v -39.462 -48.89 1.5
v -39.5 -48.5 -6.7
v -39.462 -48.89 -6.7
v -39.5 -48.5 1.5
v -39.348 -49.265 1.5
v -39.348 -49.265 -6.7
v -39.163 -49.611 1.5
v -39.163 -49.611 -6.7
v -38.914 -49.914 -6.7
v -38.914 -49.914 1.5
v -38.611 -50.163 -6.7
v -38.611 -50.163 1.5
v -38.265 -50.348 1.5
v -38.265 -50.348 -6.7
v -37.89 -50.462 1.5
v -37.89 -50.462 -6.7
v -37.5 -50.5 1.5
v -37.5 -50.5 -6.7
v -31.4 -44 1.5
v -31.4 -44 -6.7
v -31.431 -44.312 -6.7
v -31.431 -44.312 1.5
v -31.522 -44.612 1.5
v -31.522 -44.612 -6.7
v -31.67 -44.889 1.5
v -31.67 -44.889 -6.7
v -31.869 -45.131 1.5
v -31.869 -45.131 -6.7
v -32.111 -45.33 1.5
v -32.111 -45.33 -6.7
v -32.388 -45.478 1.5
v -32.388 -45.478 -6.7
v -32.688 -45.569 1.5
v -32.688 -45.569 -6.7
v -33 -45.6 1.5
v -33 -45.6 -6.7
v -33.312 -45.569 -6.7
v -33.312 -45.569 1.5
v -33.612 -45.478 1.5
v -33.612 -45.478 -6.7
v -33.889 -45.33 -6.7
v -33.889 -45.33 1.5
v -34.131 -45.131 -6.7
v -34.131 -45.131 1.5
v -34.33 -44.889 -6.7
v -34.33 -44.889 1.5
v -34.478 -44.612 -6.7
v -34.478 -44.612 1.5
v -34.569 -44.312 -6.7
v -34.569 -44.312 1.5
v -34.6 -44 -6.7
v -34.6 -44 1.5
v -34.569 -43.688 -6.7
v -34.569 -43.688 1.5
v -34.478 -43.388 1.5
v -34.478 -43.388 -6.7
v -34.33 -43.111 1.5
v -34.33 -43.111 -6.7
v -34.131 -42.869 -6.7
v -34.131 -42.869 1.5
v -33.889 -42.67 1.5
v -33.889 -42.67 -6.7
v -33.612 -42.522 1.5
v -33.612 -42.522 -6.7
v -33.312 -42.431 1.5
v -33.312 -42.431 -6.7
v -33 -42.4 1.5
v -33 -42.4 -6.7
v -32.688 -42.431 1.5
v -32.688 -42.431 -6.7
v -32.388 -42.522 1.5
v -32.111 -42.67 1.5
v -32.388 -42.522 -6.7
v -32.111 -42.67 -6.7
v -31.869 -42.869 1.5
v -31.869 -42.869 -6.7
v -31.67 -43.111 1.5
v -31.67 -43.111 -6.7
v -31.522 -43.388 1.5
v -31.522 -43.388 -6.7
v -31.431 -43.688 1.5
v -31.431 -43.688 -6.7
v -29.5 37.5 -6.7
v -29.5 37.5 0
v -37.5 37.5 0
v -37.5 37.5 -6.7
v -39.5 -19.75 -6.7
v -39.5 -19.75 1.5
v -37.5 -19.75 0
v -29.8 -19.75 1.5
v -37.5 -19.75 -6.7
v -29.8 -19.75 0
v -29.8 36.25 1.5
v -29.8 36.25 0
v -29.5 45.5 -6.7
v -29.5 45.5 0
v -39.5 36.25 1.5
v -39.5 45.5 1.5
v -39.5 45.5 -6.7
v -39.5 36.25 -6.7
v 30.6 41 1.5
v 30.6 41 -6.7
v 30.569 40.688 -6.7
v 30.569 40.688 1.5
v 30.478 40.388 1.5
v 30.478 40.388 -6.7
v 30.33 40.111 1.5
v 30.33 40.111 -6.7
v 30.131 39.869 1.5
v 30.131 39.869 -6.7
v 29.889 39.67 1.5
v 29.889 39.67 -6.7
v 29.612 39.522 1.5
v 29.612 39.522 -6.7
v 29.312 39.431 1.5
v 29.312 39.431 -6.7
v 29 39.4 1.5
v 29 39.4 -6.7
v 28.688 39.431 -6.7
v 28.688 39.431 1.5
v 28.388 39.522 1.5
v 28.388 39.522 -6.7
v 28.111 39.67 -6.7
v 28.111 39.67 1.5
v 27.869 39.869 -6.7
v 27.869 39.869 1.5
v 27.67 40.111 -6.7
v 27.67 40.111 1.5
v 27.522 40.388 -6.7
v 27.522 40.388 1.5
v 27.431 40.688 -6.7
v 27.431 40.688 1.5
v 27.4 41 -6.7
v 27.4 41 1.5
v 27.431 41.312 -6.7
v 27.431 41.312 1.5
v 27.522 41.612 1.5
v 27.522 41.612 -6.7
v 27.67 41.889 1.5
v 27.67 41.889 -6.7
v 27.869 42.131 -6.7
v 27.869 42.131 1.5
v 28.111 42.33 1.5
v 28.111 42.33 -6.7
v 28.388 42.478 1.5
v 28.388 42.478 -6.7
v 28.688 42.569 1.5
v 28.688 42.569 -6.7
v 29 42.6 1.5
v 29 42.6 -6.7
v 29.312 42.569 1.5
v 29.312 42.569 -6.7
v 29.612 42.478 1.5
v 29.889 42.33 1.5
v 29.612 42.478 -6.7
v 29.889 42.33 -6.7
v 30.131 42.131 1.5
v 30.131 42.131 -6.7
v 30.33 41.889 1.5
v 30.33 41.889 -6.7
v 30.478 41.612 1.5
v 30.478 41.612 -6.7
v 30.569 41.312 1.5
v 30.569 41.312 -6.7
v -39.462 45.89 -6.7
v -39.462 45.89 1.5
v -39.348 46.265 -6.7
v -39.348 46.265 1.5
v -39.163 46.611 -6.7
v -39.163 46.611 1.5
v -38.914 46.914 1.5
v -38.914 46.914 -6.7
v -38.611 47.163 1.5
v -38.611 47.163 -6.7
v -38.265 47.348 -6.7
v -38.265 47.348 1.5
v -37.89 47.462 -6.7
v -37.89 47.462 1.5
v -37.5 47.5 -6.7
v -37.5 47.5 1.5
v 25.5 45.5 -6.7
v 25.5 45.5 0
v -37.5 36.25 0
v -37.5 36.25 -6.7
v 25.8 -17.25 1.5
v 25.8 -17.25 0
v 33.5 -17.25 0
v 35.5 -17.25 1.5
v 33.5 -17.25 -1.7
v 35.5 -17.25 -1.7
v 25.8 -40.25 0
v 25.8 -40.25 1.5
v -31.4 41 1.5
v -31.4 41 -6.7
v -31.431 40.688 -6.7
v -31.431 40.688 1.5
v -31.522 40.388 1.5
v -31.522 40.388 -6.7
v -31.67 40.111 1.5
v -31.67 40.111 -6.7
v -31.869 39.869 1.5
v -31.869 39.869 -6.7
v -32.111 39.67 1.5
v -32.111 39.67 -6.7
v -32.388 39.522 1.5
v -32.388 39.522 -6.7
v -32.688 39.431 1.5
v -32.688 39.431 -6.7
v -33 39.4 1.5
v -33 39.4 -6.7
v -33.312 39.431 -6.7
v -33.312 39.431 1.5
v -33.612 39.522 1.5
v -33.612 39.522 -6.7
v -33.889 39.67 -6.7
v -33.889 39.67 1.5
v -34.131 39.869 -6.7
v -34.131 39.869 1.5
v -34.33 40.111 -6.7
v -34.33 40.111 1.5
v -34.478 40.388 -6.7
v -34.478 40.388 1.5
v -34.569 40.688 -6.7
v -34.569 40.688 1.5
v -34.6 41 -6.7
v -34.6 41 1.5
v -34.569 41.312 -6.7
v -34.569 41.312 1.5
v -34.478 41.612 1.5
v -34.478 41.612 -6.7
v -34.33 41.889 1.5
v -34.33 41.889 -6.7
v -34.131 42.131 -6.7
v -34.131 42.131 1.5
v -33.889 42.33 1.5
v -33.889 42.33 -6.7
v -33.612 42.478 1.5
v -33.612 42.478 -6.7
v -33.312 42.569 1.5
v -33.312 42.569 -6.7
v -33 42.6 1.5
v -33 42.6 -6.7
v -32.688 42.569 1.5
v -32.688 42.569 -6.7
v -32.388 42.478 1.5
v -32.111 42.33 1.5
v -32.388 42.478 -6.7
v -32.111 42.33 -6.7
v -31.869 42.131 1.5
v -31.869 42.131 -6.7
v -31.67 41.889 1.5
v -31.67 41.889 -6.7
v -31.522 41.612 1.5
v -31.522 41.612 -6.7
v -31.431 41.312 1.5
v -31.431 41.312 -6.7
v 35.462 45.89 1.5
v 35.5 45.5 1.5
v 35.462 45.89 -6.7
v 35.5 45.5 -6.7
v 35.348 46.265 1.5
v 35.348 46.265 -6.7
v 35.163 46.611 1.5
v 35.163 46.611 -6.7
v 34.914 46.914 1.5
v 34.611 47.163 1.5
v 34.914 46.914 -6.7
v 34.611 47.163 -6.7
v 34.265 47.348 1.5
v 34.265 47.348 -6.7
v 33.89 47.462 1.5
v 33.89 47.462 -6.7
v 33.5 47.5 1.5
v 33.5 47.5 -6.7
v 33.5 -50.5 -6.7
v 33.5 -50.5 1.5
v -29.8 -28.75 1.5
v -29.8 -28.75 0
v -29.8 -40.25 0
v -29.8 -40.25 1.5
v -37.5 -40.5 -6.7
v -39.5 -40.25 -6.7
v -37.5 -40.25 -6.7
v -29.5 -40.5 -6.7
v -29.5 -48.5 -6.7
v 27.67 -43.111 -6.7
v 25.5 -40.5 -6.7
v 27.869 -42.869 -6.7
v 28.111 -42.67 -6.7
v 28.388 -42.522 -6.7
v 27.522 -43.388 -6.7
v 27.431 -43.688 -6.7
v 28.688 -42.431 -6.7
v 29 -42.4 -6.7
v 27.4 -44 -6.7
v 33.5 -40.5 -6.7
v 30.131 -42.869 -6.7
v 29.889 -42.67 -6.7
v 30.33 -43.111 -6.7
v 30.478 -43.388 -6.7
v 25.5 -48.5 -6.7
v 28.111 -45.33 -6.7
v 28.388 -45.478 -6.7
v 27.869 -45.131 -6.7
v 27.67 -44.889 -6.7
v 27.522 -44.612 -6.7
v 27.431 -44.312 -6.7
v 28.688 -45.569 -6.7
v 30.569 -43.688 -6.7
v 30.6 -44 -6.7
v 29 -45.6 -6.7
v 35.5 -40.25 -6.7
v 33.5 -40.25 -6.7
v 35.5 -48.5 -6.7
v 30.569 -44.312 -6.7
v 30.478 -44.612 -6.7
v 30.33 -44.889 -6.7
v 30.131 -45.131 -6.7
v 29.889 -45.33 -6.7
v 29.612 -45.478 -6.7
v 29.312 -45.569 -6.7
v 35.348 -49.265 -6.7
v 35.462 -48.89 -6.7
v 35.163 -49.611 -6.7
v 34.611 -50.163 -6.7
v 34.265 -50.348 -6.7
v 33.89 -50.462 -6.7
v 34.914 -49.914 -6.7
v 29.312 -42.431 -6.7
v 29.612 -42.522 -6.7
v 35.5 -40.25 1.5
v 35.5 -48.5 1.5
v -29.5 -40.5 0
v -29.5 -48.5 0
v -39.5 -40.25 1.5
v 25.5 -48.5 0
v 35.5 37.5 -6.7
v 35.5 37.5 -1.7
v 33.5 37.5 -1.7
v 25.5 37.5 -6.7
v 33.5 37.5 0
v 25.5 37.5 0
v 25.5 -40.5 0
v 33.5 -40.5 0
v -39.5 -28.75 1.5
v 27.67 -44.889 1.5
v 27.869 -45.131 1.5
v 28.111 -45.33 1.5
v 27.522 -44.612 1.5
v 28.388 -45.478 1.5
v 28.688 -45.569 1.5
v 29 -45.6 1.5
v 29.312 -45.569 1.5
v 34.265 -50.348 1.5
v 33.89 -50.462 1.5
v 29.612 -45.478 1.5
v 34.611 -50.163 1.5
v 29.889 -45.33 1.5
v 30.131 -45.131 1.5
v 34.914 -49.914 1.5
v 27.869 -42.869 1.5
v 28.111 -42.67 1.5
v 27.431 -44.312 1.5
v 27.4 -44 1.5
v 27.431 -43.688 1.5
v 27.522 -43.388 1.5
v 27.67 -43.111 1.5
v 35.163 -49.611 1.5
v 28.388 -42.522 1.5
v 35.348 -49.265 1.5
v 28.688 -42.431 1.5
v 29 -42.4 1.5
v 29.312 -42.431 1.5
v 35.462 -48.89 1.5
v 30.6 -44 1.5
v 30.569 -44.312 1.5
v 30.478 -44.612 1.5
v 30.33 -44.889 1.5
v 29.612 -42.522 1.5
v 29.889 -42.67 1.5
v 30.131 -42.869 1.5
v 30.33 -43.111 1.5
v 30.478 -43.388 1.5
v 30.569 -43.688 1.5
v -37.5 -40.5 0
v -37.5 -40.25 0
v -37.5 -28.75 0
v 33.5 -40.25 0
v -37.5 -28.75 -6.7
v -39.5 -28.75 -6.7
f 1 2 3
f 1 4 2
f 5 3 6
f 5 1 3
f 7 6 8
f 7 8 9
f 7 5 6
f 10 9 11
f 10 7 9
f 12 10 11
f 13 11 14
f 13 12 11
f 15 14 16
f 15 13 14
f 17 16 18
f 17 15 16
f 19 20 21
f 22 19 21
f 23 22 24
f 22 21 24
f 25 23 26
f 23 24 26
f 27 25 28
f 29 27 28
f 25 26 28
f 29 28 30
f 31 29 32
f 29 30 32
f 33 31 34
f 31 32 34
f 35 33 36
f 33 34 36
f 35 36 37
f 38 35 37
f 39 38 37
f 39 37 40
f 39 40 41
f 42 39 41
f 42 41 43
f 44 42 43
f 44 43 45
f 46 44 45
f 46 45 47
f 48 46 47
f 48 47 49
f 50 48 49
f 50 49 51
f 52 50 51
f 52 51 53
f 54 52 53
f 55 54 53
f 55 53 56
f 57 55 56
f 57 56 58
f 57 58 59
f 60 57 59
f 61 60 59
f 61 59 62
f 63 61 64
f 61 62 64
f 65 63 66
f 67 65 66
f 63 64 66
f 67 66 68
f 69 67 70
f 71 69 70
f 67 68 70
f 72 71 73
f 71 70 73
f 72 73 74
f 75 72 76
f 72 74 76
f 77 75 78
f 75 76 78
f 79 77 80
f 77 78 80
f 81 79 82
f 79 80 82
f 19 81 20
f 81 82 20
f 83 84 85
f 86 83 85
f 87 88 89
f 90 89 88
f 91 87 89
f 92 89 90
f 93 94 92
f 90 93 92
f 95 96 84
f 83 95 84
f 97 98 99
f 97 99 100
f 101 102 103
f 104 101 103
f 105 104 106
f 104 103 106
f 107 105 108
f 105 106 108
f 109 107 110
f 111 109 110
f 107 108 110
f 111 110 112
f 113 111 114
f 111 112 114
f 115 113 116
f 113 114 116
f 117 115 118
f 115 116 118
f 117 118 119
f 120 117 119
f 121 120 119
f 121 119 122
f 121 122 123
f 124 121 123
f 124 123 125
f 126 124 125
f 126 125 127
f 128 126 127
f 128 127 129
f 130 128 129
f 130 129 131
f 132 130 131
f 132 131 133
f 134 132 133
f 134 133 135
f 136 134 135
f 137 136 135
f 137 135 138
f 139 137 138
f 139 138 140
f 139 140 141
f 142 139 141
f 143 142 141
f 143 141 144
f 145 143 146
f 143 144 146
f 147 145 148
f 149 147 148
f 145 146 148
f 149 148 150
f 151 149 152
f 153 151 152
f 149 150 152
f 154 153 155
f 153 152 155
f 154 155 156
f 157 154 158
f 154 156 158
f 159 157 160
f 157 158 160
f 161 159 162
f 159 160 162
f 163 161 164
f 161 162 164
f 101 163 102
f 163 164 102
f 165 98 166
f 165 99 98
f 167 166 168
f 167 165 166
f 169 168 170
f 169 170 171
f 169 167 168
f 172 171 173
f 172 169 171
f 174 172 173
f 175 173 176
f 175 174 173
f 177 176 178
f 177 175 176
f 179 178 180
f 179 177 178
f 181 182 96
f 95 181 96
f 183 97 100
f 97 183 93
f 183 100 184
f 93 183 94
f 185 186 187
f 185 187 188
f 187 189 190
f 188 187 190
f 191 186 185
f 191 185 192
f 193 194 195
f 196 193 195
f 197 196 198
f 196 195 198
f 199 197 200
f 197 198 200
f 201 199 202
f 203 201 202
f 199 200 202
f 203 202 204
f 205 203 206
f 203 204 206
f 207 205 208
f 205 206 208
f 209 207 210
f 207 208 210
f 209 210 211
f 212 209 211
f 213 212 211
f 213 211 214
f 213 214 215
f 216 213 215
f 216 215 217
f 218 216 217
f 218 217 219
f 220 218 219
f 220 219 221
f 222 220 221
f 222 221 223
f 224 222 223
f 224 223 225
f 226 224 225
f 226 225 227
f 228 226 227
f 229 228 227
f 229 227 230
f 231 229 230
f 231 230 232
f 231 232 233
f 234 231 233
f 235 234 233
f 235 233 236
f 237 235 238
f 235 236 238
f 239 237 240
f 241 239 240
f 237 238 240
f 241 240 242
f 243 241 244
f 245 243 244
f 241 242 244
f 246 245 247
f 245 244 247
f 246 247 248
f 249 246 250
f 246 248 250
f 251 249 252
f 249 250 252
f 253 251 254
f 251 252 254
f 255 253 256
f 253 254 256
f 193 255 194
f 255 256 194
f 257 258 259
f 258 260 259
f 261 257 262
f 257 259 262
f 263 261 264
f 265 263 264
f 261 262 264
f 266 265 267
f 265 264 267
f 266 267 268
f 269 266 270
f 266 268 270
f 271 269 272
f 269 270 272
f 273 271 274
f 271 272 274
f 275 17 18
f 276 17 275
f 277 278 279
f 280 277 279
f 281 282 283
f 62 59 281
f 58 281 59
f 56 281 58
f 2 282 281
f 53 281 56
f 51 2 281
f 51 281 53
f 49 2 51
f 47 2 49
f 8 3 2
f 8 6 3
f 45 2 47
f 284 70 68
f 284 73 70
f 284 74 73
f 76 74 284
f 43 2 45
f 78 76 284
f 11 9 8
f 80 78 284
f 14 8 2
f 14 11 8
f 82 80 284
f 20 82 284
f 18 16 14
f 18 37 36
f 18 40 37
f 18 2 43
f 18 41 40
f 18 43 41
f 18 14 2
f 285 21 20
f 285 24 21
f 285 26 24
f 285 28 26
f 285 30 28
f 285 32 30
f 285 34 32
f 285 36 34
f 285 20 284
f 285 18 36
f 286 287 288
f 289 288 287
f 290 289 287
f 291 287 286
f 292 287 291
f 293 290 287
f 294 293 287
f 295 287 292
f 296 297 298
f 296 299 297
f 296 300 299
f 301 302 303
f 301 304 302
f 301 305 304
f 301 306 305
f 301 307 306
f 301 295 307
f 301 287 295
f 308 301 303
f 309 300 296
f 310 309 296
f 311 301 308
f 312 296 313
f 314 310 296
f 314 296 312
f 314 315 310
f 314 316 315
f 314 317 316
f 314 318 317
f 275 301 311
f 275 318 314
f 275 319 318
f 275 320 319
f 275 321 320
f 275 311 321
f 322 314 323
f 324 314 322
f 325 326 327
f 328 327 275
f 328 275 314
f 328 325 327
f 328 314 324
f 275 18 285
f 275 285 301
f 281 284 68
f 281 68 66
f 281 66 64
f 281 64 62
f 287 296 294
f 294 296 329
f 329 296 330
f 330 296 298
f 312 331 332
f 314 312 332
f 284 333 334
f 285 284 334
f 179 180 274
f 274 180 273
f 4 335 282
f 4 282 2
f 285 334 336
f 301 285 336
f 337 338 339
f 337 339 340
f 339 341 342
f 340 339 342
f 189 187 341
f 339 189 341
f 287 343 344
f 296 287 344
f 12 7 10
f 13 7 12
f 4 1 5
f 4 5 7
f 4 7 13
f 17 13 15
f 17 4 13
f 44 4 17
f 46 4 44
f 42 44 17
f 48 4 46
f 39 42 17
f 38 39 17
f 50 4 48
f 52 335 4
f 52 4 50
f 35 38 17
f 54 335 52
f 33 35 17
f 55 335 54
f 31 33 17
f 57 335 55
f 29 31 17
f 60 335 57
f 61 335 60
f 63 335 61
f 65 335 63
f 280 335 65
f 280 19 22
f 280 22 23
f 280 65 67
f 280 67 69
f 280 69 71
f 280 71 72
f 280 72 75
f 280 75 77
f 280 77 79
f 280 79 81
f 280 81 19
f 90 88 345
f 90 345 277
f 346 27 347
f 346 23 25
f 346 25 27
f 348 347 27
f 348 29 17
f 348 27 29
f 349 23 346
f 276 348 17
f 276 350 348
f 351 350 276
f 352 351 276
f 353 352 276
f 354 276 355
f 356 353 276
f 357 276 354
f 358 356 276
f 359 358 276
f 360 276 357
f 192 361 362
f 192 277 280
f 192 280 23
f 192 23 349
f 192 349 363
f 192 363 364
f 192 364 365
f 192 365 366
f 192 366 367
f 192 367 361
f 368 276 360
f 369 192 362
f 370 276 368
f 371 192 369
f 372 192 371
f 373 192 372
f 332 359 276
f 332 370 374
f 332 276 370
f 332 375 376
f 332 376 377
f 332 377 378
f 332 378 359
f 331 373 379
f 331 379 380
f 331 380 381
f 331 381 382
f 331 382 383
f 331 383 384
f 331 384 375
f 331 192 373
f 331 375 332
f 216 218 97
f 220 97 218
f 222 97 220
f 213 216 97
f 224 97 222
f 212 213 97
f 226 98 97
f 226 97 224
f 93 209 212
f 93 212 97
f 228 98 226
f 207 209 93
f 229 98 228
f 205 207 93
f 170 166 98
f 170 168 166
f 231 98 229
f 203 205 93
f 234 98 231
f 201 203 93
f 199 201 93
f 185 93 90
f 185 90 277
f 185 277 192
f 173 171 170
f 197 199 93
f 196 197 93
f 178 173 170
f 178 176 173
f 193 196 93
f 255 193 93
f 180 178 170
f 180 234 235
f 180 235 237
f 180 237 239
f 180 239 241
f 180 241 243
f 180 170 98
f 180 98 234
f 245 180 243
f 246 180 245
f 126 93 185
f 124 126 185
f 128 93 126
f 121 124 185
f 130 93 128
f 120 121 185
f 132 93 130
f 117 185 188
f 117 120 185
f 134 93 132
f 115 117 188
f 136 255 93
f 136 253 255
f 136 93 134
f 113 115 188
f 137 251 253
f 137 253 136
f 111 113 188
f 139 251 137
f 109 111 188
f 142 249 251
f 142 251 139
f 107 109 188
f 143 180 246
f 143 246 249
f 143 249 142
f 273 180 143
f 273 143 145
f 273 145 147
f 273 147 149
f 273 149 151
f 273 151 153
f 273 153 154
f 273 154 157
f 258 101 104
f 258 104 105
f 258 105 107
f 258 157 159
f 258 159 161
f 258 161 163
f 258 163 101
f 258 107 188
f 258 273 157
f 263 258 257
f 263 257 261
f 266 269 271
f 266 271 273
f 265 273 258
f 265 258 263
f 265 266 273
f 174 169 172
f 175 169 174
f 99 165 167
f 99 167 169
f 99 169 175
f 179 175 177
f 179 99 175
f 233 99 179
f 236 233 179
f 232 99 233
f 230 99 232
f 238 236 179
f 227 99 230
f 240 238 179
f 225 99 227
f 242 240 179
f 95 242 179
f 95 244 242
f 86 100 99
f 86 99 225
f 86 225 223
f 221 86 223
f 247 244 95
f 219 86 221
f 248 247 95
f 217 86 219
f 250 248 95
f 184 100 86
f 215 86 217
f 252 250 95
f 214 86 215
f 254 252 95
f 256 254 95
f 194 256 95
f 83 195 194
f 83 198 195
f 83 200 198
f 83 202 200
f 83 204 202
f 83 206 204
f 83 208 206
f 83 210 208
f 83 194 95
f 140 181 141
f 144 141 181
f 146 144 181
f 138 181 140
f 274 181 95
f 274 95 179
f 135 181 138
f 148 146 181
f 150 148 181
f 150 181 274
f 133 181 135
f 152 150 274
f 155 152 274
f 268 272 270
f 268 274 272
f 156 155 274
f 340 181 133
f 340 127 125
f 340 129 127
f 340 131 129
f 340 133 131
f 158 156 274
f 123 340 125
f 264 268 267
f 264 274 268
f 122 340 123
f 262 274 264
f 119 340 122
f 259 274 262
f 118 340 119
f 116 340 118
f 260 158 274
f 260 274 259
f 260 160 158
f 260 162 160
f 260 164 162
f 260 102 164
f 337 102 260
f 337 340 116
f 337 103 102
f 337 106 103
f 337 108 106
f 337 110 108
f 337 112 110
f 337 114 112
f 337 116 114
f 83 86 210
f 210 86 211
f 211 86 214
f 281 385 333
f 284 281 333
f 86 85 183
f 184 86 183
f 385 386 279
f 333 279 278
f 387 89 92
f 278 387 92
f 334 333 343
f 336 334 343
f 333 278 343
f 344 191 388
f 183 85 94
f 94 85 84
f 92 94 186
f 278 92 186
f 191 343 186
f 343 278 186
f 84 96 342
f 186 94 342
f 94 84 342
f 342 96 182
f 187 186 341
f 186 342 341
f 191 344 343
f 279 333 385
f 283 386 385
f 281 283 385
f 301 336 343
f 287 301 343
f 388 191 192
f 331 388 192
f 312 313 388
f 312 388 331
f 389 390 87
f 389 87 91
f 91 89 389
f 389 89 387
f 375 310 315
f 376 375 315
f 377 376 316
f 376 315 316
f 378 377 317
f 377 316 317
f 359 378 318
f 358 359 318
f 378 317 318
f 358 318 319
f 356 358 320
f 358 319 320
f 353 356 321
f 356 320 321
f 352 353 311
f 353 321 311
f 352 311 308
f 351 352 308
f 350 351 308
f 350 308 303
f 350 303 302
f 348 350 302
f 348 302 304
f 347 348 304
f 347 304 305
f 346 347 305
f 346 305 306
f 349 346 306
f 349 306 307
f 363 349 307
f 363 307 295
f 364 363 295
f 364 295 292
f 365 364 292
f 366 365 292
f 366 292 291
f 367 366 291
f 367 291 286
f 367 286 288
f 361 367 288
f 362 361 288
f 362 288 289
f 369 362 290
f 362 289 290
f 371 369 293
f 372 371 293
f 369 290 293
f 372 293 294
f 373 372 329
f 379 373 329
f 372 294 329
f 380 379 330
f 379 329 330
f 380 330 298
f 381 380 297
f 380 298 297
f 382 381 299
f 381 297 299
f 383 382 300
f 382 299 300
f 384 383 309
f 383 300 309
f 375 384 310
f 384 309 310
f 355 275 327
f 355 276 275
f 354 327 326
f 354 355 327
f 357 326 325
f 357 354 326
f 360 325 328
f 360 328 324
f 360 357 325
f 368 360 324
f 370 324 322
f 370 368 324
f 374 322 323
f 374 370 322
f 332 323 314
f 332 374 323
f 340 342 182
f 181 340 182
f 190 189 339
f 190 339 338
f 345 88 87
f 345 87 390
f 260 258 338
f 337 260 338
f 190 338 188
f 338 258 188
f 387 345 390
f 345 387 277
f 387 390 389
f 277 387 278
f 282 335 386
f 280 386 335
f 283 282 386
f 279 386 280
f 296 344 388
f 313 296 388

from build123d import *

# Parameters (mm, degrees)
F1_W      = 75
F1_H      = 98
F2_DEPTH  = 1.5
F3_W      = 75
F3_H      = 98
F4_DEPTH  = 6.7
F5_W      = 9.7
F5_H      = 56
F5_H_2    = 11.5
F5_H_3    = 23
F6_DEPTH  = 25
F7_R      = 1.6
F8_R      = 1.6
F9_DEPTH  = 25
F10_W     = 2
F10_H     = 54.75
F11_DEPTH = 5
F12_R     = 2


with BuildPart() as f2:
    # F1 (on Top) → F2 (new body)
    with BuildSketch(Plane.XY):
        with Locations((-2, -1.5)):
            Rectangle(F1_W, F1_H)
    extrude(amount=F2_DEPTH)

    # F3 (on face) → F4 (join)
    with BuildSketch(Plane(origin=(0, 0, 0), x_dir=(1, 0, 0), z_dir=(0, 0, -1))):
        with Locations((-2, 1.5)):
            Rectangle(F3_W, F3_H)
        Polygon((25.5, -37.5), (25.5, -45.5), (-29.5, -45.5), (-29.5, -37.5), (-37.5, -37.5), (-37.5, 40.5), (-29.5, 40.5), (-29.5, 48.5), (25.5, 48.5), (25.5, 40.5), (33.5, 40.5), (33.5, -37.5), align=None, mode=Mode.SUBTRACT)
    extrude(amount=F4_DEPTH)

    # F5 (on face) → F6 (cut)
    with BuildSketch(Plane(origin=(0, 0, -6.7), x_dir=(1, 0, 0), z_dir=(0, 0, -1))):
        with Locations((-34.65, -8.25)):
            Rectangle(F5_W, F5_H)
        with Locations((-34.65, 34.5)):
            Rectangle(F5_W, F5_H_2)
        with Locations((30.65, 28.75)):
            Rectangle(F5_W, F5_H_3)
    extrude(amount=-F6_DEPTH, mode=Mode.SUBTRACT)

    # F7 (on face) + F8 (on face) → F9 (cut)
    with BuildSketch(Plane(origin=(0, 0, -6.7), x_dir=(1, 0, 0), z_dir=(0, 0, -1))):
        with Locations((29, -41)):
            Circle(F7_R)
        with Locations((-33, -41)):
            Circle(F7_R)
    with BuildSketch(Plane(origin=(0, 0, -6.7), x_dir=(1, 0, 0), z_dir=(0, 0, -1))):
        with Locations((-33, 44)):
            Circle(F8_R)
        with Locations((29, 44)):
            Circle(F8_R)
    extrude(amount=-F9_DEPTH, mode=Mode.SUBTRACT)

    # F10 (on face) → F11 (cut)
    with BuildSketch(Plane(origin=(0, 0, -6.7), x_dir=(1, 0, 0), z_dir=(0, 0, -1))):
        with Locations((34.5, -10.125)):
            Rectangle(F10_W, F10_H)
    extrude(amount=-F11_DEPTH, mode=Mode.SUBTRACT)

    # F12
    f12_edges = [f2.edges().sort_by_distance(p)[0] for p in [
        (-39.5, 47.5, -2.6),
        (35.5, 47.5, -2.6),
        (-39.5, -50.5, -2.6),
        (35.5, -50.5, -2.6),
    ]]
    fillet(f12_edges, radius=F12_R)


solid = f2.part
